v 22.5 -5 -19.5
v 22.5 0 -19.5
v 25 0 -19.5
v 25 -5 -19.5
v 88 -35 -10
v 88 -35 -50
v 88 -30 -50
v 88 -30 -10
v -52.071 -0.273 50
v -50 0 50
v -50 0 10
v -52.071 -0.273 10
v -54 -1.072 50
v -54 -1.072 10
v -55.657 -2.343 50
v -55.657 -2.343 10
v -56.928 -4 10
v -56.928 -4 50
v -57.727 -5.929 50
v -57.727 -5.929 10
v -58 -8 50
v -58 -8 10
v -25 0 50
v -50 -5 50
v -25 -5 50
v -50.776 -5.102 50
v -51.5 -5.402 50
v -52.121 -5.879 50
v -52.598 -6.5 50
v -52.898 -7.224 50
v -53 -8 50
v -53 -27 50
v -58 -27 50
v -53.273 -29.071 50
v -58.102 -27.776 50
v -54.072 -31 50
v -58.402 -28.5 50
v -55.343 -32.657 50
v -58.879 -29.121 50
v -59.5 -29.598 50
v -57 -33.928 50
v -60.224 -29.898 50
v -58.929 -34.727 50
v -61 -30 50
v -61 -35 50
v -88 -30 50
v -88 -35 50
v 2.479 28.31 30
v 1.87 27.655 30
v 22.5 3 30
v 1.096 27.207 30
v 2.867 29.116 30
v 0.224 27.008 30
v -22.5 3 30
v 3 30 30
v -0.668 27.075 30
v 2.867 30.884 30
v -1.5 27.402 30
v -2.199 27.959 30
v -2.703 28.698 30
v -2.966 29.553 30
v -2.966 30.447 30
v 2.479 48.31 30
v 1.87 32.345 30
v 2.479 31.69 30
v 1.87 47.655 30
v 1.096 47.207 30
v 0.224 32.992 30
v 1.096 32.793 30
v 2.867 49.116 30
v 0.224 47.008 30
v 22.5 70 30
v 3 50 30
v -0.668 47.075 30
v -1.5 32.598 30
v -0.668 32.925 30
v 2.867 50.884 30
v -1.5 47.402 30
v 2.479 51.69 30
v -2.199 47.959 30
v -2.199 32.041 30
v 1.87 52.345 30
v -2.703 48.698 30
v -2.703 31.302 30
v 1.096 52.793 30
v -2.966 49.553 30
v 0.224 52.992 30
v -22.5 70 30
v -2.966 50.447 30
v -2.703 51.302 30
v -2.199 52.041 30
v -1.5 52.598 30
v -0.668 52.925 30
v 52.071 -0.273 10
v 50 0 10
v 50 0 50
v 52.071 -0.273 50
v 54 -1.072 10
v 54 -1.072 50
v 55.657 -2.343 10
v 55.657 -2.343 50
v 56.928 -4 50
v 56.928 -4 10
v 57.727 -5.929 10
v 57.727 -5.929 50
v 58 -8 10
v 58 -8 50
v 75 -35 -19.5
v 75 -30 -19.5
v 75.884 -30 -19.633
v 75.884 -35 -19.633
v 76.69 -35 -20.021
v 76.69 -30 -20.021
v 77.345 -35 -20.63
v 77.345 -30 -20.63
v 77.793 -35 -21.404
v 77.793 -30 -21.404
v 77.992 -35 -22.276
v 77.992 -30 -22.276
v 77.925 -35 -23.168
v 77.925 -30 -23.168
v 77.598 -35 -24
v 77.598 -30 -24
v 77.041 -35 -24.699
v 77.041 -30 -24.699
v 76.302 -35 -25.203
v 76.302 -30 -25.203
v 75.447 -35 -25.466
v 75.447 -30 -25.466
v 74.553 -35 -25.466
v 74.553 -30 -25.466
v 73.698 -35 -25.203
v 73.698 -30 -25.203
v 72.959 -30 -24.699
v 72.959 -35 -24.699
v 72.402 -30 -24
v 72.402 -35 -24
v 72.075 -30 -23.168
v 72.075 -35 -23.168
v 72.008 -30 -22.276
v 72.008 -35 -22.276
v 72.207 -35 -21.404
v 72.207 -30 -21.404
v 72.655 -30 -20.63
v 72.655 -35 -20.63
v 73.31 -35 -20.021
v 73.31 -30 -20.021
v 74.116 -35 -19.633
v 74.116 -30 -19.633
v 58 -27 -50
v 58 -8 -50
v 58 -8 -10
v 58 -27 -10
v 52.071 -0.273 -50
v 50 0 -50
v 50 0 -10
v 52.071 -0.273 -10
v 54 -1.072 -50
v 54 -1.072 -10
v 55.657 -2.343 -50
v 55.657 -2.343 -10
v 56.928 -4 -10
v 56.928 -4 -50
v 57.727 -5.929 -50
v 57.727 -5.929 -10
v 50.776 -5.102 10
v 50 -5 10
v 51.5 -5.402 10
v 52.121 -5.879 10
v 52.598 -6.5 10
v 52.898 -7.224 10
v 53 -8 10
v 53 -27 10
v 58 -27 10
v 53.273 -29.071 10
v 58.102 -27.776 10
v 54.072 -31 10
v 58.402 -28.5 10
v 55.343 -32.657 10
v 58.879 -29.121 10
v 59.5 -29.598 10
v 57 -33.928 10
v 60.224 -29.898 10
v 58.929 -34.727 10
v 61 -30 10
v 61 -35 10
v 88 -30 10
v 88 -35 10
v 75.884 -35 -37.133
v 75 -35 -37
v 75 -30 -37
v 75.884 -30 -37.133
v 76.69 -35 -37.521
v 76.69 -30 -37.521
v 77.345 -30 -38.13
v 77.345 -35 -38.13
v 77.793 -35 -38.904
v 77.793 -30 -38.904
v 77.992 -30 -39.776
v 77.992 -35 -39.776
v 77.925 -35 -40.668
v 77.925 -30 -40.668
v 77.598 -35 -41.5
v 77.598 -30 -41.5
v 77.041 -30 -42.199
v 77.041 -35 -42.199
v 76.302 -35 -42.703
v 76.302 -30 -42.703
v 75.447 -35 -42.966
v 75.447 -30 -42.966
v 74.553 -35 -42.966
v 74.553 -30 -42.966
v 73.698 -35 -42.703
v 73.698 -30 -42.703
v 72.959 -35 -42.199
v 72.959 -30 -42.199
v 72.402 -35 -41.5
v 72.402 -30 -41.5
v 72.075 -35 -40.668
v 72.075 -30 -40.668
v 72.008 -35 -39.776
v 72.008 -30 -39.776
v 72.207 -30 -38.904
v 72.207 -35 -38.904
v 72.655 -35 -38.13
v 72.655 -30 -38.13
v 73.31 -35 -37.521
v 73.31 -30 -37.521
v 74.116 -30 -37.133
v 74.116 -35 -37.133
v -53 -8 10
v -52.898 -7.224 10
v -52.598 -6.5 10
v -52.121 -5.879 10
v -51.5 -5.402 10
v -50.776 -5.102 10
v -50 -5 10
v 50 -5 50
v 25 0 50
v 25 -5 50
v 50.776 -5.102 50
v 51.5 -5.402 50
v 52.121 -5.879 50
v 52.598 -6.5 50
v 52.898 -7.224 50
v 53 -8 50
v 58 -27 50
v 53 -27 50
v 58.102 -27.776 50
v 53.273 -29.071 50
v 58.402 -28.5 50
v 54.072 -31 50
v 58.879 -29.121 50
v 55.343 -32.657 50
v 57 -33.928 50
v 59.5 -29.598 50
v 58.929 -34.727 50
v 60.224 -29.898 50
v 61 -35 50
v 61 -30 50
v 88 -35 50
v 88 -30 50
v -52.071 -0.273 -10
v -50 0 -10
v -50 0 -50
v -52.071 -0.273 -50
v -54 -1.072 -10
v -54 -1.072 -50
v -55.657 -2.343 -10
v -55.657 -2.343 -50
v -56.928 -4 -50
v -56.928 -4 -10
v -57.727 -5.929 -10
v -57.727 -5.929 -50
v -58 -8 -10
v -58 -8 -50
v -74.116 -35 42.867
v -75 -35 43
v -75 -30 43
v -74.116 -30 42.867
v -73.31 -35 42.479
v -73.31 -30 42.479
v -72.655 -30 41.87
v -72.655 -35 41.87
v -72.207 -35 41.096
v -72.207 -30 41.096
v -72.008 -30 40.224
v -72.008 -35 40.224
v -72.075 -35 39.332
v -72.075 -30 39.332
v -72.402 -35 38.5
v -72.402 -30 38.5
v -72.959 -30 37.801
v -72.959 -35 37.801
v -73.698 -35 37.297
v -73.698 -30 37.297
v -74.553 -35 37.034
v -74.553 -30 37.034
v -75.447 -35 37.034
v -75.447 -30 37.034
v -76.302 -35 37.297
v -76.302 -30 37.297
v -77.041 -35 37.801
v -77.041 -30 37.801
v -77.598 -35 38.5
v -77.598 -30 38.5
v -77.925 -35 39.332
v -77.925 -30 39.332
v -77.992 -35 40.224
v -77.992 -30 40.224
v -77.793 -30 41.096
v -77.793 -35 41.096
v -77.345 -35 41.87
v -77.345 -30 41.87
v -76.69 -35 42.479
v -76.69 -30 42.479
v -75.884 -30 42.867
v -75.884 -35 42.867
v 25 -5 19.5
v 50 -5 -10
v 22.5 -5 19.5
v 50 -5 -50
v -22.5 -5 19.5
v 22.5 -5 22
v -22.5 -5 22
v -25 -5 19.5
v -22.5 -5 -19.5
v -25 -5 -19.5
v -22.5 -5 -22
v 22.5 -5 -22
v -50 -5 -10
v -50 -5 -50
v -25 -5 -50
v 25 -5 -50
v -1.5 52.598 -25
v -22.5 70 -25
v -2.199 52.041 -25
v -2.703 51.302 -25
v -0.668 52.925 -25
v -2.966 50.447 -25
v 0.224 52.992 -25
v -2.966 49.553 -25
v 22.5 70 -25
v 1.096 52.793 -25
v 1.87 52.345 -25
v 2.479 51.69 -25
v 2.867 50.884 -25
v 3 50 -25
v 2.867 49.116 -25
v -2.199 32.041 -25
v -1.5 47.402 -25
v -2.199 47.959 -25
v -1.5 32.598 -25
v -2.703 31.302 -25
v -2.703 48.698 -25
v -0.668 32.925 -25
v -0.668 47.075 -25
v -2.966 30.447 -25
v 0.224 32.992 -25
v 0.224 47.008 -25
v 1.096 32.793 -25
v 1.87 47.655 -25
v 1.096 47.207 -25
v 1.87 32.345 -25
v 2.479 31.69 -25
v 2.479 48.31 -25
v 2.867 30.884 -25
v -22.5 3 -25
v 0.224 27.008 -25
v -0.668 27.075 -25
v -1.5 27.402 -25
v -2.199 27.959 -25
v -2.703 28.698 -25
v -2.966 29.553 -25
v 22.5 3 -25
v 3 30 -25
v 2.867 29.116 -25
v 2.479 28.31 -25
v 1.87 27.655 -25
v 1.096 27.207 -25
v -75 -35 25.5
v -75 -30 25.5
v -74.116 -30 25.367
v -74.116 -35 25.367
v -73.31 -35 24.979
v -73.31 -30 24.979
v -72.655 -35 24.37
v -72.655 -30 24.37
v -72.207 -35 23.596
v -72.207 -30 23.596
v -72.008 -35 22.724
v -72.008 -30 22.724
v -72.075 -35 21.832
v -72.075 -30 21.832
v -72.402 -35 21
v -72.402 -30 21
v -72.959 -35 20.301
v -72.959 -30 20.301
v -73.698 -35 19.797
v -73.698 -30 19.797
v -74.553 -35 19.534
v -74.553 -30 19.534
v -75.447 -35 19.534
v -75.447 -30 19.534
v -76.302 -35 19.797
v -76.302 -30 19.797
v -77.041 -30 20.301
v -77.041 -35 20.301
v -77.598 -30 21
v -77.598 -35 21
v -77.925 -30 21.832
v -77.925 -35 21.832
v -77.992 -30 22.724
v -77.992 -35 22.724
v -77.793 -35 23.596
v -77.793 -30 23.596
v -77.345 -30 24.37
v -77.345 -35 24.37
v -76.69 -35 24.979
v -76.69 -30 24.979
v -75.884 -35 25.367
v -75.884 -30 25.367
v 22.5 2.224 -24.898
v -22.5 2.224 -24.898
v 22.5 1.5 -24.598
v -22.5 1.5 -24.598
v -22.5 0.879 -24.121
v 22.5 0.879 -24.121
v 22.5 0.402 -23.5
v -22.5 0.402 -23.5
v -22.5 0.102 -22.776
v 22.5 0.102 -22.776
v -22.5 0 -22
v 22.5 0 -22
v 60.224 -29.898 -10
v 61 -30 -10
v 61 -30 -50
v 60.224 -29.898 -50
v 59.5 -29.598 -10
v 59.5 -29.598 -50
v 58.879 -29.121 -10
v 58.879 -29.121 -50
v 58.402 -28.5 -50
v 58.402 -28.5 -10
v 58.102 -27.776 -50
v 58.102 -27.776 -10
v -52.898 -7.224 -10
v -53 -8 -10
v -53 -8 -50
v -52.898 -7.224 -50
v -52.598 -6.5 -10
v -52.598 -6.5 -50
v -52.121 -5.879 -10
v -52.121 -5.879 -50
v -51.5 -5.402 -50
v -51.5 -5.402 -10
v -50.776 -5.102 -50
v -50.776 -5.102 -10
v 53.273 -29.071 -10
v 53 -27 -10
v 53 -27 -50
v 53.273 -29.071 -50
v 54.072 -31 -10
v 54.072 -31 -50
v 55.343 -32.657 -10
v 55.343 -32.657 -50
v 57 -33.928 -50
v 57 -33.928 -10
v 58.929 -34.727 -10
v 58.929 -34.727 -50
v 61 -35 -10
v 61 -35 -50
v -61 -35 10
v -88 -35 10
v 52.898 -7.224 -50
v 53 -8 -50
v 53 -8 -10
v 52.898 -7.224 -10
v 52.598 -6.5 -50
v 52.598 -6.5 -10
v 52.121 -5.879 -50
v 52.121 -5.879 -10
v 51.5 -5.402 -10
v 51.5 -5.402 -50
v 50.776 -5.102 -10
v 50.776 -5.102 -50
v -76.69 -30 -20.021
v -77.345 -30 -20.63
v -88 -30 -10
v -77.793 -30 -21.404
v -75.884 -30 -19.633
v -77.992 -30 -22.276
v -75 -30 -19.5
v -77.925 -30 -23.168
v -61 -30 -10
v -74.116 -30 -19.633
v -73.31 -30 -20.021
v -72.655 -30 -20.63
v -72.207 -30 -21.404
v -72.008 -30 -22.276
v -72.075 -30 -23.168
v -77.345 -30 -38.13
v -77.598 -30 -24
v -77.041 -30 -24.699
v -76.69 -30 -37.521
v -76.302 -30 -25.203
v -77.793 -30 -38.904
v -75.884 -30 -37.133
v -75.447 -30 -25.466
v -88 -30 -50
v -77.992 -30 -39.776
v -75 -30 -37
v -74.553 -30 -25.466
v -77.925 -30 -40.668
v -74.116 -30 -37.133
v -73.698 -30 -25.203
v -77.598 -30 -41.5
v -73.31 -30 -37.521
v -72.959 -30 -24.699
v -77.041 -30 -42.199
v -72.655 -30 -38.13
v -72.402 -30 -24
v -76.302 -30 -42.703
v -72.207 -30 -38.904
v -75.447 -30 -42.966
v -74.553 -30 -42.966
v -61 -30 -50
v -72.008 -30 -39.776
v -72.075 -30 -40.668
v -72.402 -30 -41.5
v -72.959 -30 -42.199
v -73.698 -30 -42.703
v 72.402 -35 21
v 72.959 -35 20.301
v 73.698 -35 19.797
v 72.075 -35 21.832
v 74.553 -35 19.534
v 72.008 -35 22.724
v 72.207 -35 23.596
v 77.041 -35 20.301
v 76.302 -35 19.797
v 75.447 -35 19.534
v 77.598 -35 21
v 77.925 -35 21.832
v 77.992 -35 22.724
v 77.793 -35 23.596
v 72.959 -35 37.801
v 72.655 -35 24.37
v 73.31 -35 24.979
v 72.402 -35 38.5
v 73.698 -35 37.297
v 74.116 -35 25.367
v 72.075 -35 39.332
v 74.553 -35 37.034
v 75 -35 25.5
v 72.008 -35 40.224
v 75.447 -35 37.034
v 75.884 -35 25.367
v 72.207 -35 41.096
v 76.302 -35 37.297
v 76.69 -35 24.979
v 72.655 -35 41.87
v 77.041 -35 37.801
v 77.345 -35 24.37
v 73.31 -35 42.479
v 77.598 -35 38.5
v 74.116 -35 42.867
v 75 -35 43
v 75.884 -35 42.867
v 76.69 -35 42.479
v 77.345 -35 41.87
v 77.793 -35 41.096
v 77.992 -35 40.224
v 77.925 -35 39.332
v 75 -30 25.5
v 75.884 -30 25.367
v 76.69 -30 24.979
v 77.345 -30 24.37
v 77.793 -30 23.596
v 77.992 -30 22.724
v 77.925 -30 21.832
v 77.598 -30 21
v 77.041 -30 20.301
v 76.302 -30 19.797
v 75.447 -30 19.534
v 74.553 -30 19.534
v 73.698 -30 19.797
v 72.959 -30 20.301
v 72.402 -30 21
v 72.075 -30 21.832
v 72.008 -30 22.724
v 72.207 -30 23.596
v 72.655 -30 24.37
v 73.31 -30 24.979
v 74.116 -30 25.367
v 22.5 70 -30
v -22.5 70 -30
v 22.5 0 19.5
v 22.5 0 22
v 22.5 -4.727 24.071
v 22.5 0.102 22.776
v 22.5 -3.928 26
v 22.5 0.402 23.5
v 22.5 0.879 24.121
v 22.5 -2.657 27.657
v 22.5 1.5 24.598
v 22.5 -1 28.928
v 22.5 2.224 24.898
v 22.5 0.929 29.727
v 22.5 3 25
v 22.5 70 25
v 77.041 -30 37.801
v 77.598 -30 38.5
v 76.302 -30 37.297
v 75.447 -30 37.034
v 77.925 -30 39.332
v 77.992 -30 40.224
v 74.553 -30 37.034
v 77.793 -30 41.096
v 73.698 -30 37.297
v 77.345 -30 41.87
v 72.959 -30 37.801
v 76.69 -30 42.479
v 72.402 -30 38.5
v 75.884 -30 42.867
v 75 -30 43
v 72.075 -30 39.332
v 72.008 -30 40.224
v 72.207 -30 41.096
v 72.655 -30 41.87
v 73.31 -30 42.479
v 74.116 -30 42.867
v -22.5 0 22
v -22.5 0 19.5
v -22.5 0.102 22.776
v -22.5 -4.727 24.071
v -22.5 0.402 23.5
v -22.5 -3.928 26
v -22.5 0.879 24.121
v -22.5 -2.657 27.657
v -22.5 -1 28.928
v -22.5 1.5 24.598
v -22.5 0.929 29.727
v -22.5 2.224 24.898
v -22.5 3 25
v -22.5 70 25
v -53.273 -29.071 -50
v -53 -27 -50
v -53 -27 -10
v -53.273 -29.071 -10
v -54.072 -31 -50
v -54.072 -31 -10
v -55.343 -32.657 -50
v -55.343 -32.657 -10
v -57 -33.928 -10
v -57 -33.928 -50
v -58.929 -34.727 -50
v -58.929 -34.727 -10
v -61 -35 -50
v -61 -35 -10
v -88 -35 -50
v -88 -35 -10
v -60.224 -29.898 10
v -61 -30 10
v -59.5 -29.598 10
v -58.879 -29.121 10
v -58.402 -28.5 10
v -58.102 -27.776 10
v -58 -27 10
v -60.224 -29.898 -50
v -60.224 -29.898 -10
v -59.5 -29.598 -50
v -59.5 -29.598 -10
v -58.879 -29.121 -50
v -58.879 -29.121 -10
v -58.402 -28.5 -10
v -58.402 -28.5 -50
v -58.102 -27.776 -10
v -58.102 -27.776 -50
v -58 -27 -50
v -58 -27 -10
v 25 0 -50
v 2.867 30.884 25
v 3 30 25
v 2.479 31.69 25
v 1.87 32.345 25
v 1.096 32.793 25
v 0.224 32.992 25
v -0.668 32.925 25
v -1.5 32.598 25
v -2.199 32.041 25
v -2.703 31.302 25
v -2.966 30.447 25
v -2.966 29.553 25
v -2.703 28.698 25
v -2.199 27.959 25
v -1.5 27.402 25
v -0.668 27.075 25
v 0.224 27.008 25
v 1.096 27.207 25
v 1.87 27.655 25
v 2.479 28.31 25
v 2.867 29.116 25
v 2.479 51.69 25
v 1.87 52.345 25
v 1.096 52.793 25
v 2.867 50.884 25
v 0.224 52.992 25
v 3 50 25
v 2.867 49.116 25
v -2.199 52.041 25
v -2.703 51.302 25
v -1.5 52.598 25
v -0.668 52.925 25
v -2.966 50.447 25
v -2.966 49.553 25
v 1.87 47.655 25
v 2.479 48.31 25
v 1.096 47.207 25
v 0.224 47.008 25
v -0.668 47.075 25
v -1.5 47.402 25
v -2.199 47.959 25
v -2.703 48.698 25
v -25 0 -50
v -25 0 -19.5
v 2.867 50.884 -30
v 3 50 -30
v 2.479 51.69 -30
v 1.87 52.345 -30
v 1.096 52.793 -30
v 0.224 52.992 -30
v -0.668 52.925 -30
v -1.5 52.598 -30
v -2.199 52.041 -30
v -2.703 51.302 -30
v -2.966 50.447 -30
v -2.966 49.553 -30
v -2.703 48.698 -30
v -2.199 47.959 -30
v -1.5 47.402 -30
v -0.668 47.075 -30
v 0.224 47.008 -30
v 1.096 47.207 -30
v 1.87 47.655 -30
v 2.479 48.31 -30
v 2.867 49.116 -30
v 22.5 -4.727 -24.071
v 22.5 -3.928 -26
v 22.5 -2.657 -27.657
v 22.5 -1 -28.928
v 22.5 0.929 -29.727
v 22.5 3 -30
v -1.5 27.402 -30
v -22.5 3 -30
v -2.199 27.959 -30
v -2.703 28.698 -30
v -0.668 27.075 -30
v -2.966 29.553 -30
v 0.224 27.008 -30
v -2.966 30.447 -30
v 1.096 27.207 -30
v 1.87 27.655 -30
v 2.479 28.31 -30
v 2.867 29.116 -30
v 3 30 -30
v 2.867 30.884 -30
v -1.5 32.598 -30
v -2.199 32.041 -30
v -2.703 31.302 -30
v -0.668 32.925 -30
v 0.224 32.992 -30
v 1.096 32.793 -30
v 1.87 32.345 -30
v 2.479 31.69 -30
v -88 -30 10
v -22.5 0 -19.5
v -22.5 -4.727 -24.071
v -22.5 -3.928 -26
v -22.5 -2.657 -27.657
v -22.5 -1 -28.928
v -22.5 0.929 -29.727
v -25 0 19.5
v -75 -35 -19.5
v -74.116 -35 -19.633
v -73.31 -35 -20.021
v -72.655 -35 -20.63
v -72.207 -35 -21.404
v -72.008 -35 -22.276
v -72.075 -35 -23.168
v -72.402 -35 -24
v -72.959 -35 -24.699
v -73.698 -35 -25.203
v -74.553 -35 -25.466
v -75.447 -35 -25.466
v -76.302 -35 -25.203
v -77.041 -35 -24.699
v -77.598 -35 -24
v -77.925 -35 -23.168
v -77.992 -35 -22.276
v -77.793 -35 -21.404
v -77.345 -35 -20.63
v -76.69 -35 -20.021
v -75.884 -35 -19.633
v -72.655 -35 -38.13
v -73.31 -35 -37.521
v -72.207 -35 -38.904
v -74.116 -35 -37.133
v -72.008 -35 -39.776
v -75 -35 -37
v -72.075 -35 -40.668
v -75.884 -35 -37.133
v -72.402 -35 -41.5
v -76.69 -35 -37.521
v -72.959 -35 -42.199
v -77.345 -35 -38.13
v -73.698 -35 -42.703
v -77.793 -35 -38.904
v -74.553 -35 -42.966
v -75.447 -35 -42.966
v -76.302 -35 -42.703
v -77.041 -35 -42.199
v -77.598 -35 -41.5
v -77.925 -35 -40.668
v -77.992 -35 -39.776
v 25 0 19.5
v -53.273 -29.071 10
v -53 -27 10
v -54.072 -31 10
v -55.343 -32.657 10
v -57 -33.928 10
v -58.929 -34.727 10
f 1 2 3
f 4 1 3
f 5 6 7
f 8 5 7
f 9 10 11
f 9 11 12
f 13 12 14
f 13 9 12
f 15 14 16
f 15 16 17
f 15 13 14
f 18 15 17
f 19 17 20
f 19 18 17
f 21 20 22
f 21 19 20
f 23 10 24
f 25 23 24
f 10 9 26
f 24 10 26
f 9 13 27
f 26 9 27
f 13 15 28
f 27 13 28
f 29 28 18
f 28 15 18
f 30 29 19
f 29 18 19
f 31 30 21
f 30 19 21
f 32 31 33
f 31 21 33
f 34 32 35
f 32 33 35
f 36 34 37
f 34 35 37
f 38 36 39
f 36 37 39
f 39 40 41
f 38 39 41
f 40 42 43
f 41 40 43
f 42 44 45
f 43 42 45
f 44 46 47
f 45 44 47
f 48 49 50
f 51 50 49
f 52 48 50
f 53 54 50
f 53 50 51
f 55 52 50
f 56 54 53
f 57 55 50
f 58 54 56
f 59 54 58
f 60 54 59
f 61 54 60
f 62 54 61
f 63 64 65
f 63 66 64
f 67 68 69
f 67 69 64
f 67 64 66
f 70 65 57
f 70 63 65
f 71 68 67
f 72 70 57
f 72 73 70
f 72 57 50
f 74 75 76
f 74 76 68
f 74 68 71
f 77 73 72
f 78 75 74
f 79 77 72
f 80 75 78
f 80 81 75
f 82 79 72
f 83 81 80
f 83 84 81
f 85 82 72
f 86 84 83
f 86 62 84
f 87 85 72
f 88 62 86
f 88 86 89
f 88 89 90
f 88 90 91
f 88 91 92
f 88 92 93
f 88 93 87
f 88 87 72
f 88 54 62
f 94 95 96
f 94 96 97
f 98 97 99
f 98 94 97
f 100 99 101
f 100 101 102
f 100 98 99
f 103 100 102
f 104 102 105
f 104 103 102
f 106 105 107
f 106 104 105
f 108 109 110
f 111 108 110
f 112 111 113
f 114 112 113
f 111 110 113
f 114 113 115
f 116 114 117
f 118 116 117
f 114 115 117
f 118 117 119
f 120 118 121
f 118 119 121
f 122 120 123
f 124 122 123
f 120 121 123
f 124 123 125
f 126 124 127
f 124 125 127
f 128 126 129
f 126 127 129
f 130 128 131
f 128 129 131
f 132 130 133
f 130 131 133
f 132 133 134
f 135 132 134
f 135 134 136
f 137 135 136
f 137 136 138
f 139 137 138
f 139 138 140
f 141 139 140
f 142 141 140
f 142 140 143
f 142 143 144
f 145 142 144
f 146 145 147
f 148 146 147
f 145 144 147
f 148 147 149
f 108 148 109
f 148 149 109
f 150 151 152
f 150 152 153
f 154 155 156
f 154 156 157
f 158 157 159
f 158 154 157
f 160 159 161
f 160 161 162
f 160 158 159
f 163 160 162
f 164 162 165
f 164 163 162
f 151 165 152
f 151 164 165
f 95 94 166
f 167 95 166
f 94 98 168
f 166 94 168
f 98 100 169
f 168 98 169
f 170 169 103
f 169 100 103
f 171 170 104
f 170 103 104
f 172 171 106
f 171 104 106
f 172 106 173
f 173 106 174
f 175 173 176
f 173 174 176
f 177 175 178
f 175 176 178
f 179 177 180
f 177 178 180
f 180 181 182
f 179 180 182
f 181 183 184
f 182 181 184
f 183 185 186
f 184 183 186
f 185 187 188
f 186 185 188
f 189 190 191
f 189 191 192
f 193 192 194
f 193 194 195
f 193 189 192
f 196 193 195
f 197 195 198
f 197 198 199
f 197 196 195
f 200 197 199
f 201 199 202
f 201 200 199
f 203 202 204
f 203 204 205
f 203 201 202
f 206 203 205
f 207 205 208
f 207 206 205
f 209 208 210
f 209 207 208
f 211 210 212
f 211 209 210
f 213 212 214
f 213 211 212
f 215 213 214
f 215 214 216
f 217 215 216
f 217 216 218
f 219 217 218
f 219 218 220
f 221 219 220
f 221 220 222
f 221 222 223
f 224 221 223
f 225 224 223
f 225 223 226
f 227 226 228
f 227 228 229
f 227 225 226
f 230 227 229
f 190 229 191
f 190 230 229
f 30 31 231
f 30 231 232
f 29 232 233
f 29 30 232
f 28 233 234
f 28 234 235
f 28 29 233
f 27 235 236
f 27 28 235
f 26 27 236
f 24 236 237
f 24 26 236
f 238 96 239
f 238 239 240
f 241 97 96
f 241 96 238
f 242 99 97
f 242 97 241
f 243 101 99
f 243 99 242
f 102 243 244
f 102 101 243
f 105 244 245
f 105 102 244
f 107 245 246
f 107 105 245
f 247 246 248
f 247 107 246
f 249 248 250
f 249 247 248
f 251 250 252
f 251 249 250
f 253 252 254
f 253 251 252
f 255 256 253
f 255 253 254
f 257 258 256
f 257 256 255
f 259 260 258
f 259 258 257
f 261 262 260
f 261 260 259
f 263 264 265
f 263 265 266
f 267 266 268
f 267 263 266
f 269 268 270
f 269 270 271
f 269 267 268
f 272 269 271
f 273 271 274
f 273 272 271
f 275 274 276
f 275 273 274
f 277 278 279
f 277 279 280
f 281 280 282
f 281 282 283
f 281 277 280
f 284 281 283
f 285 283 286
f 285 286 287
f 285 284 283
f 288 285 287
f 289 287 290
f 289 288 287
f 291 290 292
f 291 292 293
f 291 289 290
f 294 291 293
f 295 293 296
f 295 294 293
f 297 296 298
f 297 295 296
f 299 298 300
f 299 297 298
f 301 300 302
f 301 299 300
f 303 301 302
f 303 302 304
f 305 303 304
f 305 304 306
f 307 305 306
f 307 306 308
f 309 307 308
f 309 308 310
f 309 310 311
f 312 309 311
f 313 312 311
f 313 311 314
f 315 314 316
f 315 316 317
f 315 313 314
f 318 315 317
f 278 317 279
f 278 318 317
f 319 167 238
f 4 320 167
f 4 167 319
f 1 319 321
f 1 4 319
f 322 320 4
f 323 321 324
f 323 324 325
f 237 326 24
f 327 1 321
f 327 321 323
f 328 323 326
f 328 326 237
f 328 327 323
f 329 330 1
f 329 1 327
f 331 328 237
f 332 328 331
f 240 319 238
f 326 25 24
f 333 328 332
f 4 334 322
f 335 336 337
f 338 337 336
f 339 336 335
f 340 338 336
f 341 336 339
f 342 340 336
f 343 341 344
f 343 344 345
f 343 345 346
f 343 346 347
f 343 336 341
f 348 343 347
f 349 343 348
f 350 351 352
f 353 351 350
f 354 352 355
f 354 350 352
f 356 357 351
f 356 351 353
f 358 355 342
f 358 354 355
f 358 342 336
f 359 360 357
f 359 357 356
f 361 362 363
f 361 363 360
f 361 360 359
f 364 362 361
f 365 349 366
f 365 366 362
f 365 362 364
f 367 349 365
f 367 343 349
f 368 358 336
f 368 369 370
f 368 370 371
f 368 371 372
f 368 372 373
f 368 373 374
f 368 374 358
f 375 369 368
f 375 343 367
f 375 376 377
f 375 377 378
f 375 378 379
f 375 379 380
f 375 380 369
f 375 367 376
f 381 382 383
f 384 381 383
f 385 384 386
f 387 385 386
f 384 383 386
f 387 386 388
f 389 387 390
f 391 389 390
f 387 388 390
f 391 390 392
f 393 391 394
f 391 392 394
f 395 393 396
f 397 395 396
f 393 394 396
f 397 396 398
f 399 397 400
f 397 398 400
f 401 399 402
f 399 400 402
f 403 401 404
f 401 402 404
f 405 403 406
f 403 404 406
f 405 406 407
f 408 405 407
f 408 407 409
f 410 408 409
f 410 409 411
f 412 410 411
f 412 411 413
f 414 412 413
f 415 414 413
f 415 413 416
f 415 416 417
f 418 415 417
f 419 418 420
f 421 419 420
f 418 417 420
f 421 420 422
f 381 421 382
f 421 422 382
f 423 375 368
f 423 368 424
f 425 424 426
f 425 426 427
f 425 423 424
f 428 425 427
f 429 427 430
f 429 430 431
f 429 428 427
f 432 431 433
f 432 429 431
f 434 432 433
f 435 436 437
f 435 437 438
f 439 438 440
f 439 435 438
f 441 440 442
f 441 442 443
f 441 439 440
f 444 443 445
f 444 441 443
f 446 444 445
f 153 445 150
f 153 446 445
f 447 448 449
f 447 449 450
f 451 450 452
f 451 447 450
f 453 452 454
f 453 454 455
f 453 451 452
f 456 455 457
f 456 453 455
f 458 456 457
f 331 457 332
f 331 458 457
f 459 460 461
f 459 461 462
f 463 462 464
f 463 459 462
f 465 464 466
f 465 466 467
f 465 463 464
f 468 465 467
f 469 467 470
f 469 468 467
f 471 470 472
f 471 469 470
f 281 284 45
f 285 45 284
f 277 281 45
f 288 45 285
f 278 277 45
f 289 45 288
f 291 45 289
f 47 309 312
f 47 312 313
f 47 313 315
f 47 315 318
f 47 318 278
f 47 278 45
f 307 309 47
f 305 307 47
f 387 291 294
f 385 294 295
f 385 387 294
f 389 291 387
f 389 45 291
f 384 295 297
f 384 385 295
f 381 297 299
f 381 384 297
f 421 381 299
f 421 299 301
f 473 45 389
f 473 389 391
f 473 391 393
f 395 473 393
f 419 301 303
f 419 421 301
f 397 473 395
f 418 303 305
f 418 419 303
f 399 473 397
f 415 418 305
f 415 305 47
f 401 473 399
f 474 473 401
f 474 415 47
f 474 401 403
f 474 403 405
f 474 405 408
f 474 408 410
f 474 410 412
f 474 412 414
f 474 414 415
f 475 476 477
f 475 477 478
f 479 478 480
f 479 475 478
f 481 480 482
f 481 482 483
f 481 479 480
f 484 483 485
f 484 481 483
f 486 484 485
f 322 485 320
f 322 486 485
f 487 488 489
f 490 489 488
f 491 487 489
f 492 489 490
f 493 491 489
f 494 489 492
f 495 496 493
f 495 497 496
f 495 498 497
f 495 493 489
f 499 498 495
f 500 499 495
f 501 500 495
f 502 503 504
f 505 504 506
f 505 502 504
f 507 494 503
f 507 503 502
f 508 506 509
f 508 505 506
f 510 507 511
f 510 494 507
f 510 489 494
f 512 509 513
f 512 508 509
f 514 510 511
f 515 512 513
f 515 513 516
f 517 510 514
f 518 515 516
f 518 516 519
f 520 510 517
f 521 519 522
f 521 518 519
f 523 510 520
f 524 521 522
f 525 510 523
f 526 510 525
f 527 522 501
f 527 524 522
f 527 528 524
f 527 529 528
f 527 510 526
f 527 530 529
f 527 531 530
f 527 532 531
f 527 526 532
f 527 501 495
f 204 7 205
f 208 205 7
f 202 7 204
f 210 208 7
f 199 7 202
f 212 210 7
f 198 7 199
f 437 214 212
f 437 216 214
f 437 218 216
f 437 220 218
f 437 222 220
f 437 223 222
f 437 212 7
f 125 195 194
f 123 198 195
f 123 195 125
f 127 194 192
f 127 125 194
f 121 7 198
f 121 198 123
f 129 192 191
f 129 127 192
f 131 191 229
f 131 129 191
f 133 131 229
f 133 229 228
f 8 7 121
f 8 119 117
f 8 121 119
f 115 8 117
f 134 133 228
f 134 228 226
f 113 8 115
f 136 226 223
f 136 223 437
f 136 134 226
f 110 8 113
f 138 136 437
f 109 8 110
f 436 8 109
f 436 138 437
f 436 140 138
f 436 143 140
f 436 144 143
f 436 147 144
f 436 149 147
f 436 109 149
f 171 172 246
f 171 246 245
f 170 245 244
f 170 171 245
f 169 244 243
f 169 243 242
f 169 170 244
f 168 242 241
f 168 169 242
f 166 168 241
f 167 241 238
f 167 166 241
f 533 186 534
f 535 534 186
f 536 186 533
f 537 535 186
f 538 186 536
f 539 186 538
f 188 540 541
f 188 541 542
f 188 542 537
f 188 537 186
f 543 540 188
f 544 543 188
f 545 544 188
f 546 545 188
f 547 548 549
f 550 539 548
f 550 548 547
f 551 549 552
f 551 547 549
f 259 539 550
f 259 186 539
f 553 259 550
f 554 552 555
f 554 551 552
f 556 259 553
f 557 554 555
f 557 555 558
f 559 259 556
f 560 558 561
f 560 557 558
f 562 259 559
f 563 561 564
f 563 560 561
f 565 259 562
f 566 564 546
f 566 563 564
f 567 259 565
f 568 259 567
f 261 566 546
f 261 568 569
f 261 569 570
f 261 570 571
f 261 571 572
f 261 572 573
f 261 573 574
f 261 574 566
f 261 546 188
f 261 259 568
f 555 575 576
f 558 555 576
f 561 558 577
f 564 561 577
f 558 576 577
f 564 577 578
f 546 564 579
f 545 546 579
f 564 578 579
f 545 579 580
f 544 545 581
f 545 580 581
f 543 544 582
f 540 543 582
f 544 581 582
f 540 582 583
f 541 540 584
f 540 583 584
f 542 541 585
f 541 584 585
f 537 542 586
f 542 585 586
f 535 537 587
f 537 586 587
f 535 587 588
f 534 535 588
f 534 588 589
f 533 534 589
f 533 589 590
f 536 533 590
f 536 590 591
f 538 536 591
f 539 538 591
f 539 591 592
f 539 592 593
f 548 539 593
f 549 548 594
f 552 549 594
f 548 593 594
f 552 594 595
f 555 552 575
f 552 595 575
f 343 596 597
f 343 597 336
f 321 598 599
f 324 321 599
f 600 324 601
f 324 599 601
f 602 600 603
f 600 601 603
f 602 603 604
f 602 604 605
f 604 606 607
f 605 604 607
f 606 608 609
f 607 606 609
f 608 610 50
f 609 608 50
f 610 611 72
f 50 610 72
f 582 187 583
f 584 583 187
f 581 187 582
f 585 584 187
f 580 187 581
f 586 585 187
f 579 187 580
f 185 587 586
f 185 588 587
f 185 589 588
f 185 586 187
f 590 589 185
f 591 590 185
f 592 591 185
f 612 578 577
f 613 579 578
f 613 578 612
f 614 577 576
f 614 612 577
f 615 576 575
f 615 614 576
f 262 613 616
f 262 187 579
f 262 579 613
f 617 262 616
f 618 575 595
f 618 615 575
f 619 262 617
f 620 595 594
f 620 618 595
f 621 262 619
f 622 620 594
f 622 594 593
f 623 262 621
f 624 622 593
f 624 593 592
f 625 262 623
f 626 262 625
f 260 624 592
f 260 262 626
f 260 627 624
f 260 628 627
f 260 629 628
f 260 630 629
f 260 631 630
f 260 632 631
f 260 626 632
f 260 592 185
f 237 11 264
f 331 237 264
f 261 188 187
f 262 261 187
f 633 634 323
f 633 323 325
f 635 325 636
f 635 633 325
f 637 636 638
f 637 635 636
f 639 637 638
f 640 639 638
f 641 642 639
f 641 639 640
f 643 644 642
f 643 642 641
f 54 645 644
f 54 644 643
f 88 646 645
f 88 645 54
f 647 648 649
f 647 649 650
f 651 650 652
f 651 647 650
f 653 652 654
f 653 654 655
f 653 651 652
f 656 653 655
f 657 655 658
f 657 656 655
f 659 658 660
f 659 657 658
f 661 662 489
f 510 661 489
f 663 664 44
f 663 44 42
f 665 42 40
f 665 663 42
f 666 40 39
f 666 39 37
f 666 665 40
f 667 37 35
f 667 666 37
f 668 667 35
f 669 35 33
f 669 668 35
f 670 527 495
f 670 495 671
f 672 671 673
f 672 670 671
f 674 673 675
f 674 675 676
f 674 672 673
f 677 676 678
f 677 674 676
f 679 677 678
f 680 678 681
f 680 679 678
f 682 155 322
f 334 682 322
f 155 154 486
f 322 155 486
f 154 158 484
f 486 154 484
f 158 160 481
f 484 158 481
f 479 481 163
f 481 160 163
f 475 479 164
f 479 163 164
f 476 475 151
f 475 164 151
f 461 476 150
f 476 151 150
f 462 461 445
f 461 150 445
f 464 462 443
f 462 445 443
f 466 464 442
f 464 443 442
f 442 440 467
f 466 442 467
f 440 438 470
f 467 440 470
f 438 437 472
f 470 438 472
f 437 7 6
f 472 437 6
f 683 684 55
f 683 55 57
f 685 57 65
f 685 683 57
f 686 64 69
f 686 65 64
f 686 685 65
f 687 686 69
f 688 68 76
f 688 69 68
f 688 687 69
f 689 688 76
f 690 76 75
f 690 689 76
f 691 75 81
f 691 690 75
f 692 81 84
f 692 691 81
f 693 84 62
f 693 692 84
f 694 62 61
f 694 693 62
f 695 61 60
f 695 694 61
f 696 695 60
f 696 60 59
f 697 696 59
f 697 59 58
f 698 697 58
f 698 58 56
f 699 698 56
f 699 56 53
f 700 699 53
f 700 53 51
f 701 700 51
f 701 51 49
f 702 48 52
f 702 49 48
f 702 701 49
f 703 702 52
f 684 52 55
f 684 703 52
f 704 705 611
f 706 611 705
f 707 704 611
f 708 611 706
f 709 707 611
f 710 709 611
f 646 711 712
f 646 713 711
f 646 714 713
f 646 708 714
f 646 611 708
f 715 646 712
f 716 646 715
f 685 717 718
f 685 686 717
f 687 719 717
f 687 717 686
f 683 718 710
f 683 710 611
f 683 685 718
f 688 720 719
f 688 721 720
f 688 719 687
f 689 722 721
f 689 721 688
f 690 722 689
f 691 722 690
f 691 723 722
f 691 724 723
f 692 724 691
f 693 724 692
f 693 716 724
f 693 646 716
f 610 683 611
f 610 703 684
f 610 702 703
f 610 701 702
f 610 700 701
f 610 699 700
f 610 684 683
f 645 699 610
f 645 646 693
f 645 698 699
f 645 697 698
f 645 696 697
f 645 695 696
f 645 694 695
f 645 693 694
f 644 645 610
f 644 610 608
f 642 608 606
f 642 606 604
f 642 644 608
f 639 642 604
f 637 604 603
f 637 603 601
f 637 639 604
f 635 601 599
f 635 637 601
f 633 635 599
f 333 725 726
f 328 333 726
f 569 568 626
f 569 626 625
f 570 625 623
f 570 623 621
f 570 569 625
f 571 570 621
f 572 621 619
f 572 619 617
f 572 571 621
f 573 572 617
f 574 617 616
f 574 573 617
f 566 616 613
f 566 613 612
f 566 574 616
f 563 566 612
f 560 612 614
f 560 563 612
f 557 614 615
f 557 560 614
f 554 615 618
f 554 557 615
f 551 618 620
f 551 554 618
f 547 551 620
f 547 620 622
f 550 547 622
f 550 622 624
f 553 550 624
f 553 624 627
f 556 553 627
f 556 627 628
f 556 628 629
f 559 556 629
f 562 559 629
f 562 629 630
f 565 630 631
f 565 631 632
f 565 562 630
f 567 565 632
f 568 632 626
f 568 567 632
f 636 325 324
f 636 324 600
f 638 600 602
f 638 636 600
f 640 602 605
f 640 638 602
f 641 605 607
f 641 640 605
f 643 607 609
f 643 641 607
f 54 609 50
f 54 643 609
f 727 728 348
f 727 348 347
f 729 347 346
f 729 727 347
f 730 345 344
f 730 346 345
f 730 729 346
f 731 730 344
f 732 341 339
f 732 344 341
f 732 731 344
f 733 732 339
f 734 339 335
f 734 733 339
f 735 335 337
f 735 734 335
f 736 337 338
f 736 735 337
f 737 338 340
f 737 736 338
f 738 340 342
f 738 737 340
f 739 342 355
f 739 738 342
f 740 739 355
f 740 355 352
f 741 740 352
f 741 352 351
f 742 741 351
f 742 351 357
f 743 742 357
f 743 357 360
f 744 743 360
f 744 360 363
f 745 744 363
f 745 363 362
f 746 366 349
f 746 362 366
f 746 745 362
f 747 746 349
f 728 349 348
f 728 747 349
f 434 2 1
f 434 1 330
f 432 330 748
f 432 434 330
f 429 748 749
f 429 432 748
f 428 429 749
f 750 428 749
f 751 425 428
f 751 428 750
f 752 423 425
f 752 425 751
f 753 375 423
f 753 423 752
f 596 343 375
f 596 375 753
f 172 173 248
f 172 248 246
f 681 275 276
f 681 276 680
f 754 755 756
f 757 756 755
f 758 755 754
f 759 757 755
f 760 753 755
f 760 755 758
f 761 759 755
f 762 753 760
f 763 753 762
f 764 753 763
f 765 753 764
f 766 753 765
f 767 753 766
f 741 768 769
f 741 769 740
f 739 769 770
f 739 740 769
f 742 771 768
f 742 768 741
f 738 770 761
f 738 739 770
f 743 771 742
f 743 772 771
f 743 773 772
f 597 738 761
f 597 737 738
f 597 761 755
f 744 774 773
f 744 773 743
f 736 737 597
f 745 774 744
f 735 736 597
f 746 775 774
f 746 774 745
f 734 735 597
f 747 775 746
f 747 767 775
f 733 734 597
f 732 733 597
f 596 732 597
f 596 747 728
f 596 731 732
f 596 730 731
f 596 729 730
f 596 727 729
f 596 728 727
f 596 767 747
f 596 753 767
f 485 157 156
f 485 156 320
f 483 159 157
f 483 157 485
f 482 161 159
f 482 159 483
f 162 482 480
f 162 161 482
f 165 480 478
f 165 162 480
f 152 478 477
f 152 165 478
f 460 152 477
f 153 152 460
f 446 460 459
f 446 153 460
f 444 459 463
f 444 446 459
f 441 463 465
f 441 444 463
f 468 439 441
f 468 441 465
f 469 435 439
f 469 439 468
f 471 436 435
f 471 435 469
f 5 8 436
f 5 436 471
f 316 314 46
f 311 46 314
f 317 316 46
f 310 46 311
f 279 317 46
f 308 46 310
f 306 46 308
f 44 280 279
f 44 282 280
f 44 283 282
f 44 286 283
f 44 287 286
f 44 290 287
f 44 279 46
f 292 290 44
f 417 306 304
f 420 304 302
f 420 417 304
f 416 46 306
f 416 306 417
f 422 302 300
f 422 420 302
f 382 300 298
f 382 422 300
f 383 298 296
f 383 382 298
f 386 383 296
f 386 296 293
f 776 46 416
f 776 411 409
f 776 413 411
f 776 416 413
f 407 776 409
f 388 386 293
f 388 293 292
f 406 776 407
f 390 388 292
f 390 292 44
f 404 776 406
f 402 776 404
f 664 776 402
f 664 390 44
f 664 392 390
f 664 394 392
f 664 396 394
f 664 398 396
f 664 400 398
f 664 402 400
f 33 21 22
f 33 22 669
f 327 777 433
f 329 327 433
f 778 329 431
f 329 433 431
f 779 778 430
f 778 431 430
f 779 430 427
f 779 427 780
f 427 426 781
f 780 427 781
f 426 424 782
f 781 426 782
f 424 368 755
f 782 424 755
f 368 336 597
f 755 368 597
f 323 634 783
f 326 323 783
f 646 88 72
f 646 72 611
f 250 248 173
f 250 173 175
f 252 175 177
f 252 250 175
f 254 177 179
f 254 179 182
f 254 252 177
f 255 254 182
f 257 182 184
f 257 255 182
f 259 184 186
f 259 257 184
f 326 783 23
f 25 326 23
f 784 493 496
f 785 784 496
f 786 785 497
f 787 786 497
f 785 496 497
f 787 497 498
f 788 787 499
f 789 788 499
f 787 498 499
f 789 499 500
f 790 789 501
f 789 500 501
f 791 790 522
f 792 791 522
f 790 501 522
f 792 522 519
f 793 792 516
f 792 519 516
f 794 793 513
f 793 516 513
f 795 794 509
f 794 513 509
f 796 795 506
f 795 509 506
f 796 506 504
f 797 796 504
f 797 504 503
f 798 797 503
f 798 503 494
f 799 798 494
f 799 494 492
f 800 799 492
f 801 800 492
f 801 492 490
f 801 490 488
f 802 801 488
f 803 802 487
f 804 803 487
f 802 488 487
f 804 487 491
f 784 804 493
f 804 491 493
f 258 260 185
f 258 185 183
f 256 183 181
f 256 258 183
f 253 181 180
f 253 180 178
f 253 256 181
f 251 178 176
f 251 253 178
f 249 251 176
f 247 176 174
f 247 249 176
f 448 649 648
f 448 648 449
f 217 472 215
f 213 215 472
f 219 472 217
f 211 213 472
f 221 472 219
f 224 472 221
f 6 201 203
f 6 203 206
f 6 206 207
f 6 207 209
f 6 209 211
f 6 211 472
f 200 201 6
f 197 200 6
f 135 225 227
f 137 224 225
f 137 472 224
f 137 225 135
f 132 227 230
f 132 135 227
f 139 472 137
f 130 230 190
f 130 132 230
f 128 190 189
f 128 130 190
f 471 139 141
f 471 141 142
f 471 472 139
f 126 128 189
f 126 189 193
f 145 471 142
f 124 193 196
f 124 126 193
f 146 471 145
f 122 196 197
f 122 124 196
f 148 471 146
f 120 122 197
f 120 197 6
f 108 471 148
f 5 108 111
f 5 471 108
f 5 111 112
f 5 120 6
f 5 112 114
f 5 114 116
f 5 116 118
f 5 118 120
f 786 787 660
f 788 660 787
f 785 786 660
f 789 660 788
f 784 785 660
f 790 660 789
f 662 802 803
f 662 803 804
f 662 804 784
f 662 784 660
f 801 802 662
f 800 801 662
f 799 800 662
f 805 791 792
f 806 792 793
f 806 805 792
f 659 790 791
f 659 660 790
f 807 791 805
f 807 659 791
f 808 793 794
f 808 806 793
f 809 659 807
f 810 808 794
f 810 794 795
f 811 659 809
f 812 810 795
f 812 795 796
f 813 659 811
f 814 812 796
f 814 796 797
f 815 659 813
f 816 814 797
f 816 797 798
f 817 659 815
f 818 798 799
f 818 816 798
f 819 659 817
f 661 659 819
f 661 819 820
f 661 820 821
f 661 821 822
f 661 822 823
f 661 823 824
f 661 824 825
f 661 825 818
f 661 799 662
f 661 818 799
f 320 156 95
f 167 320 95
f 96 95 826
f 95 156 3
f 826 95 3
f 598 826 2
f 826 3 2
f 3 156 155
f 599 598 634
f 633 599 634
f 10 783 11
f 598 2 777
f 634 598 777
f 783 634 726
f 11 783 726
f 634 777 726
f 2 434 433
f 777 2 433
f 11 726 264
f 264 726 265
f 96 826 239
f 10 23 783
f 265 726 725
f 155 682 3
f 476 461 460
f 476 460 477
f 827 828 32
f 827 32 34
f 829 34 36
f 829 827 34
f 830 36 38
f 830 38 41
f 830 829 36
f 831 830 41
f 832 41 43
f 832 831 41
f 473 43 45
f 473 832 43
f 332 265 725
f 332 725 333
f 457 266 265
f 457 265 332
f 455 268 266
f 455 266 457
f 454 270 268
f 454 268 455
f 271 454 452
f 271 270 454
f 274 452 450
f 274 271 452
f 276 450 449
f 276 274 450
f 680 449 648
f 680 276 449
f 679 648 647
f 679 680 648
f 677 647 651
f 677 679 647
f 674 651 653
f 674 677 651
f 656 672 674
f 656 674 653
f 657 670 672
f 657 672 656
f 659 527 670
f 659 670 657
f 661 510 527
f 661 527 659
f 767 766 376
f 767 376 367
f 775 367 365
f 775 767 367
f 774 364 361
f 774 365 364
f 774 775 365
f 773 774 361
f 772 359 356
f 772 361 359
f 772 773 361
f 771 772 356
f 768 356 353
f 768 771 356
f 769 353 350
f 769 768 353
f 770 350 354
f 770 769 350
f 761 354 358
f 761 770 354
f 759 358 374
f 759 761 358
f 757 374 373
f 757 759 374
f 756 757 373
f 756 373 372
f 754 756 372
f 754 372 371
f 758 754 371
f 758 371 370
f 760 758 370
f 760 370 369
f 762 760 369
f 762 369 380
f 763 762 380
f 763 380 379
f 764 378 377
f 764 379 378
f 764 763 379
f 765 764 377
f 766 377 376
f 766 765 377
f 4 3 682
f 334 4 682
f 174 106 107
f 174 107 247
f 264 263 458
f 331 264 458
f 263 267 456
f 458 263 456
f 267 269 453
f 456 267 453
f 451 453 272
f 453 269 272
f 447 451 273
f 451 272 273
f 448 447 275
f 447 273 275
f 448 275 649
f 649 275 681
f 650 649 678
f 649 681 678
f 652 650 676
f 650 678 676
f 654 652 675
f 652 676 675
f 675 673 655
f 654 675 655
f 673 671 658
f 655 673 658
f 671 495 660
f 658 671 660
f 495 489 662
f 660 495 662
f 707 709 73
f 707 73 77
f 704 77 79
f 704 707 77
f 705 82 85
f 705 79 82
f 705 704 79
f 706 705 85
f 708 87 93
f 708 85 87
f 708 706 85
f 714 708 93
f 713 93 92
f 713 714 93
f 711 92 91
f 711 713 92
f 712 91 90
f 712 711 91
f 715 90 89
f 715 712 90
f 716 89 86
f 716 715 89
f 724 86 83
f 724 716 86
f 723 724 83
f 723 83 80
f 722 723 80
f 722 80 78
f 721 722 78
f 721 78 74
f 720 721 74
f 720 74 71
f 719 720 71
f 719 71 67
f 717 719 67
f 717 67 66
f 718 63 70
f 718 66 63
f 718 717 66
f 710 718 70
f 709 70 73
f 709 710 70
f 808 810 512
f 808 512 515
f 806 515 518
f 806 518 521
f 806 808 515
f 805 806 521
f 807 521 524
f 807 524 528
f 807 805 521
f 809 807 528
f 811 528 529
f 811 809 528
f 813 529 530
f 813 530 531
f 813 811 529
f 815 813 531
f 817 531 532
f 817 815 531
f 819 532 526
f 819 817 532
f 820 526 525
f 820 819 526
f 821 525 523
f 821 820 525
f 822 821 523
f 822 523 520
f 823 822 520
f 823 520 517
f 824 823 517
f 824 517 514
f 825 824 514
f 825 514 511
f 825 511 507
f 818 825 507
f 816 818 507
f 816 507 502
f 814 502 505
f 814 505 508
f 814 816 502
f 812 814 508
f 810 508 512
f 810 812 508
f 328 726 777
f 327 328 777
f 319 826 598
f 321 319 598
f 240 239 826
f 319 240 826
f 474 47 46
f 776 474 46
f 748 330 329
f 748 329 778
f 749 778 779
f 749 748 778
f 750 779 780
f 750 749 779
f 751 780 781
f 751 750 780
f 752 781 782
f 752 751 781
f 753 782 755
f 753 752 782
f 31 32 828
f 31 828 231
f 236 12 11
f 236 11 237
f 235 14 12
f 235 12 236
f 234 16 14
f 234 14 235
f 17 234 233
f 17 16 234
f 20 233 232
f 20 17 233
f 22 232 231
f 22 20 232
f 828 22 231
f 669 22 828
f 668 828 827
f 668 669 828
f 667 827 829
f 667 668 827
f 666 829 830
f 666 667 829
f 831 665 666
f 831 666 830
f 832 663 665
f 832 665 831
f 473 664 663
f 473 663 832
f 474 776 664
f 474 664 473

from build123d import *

# Parameters (mm, degrees)
SM_BASE_FLANGE_1_DEPTH            = 5
SM_EDGE_FLANGE_1_STRIP_W          = 26
SM_EDGE_FLANGE_1_STRIP_H          = 5
SM_EDGE_FLANGE_1_STRIP_CUT_DEPTH  = 45
SM_EDGE_FLANGE_1_RELIEF_W         = 28.5
SM_EDGE_FLANGE_1_RELIEF_H         = 2.5
SM_EDGE_FLANGE_1_RELIEF_CUT_DEPTH = 5
SM_EDGE_FLANGE_1_DEPTH            = 45
SM_EDGE_FLANGE_2_STRIP_W          = 26
SM_EDGE_FLANGE_2_STRIP_H          = 5
SM_EDGE_FLANGE_2_STRIP_CUT_DEPTH  = 45
SM_EDGE_FLANGE_2_RELIEF_W         = 28.5
SM_EDGE_FLANGE_2_RELIEF_H         = 2.5
SM_EDGE_FLANGE_2_RELIEF_CUT_DEPTH = 5
SM_EDGE_FLANGE_2_DEPTH            = 45
SM_EDGE_FLANGE_14_DEPTH           = 40
SM_EDGE_FLANGE_15_DEPTH           = 40
SM_EDGE_FLANGE_16_DEPTH           = 40
SM_EDGE_FLANGE_17_DEPTH           = 40
SM_EDGE_FLANGE_18_STRIP_W         = 26
SM_EDGE_FLANGE_18_STRIP_H         = 5
SM_EDGE_FLANGE_18_STRIP_CUT_DEPTH = 40
SM_EDGE_FLANGE_18_DEPTH           = 40
SM_EDGE_FLANGE_19_STRIP_W         = 26
SM_EDGE_FLANGE_19_STRIP_H         = 5
SM_EDGE_FLANGE_19_STRIP_CUT_DEPTH = 40
SM_EDGE_FLANGE_19_DEPTH           = 40
SM_EDGE_FLANGE_20_STRIP_W         = 26
SM_EDGE_FLANGE_20_STRIP_H         = 5
SM_EDGE_FLANGE_20_STRIP_CUT_DEPTH = 40
SM_EDGE_FLANGE_20_DEPTH           = 40
SM_EDGE_FLANGE_21_STRIP_W         = 26
SM_EDGE_FLANGE_21_STRIP_H         = 5
SM_EDGE_FLANGE_21_STRIP_CUT_DEPTH = 40
SM_EDGE_FLANGE_21_DEPTH           = 40
CUT_EXTRUDE_START                 = -35
SKETCH_80_R                       = 3
CUT_EXTRUDE_1_DEPTH               = 5
CUT_EXTRUDE_3_DEPTH               = 124.060960503
CUT_EXTRUDE_3_DEPTH_BACK          = 124.060960503
SKETCH_83_R                       = 3
CUT_EXTRUDE_START_2               = -30
SKETCH_84_R                       = 3
CUT_EXTRUDE_5_DEPTH               = 5


# Sheet-metal steps are written as plain solids
with BuildPart() as part:
    # Sketch 1 → 基体-法兰1 (new body)
    with BuildSketch(Plane(origin=(0, 0, 0), x_dir=(1, 0, 0), z_dir=(0, 1, 0))):
        Polygon((-25, -25), (-25, -50), (-50, -50), (-50, 50), (-25, 50), (-25, 25), (25, 25), (25, 50), (50, 50), (50, -50), (25, -50), (25, -25), align=None)
    extrude(amount=-SM_BASE_FLANGE_1_DEPTH)

    # 边线-法兰1 strip (across the edge) → 边线-法兰1 strip cut (cut)
    with BuildSketch(Plane(origin=(22.5, 0, -25), x_dir=(0, 0, 1), z_dir=(-1, 0, 0))):
        with Locations((-10, -2.5)):
            Rectangle(SM_EDGE_FLANGE_1_STRIP_W, SM_EDGE_FLANGE_1_STRIP_H)
    extrude(amount=SM_EDGE_FLANGE_1_STRIP_CUT_DEPTH, mode=Mode.SUBTRACT)

    # 边线-法兰1 relief (on the sheet) → 边线-法兰1 relief cut (cut)
    with BuildSketch(Plane(origin=(22.5, 0, -22), x_dir=(0, 0, 1), z_dir=(0, 1, 0))):
        with Locations((-11.75, 1.25)):
            Rectangle(SM_EDGE_FLANGE_1_RELIEF_W, SM_EDGE_FLANGE_1_RELIEF_H)
        with Locations((-11.75, -46.25)):
            Rectangle(SM_EDGE_FLANGE_1_RELIEF_W, SM_EDGE_FLANGE_1_RELIEF_H)
    extrude(amount=-SM_EDGE_FLANGE_1_RELIEF_CUT_DEPTH, mode=Mode.SUBTRACT)

    # 边线-法兰1 section (across the edge) → 边线-法兰1 (add)
    with BuildSketch(Plane(origin=(22.5, 0, -25), x_dir=(0, 0, 1), z_dir=(-1, 0, 0))):
        with BuildLine():
            Line((-5, 3), (-5, 70))
            Line((-5, 70), (0, 70))
            Line((0, 70), (0, 3))
            ThreePointArc((0, 3), (0.878679656, 0.878679656), (3, 0))
            Line((3, 0), (3, -5))
            ThreePointArc((3, -5), (-2.656854249, -2.656854249), (-5, 3))
        make_face()
    extrude(amount=SM_EDGE_FLANGE_1_DEPTH)

    # 边线-法兰2 strip (across the edge) → 边线-法兰2 strip cut (cut)
    with BuildSketch(Plane(origin=(-22.5, 0, 25), x_dir=(0, 0, -1), z_dir=(1, 0, 0))):
        with Locations((-10, -2.5)):
            Rectangle(SM_EDGE_FLANGE_2_STRIP_W, SM_EDGE_FLANGE_2_STRIP_H)
    extrude(amount=SM_EDGE_FLANGE_2_STRIP_CUT_DEPTH, mode=Mode.SUBTRACT)

    # 边线-法兰2 relief (on the sheet) → 边线-法兰2 relief cut (cut)
    with BuildSketch(Plane(origin=(-22.5, 0, 22), x_dir=(0, 0, -1), z_dir=(0, 1, 0))):
        with Locations((-11.75, 1.25)):
            Rectangle(SM_EDGE_FLANGE_2_RELIEF_W, SM_EDGE_FLANGE_2_RELIEF_H)
        with Locations((-11.75, -46.25)):
            Rectangle(SM_EDGE_FLANGE_2_RELIEF_W, SM_EDGE_FLANGE_2_RELIEF_H)
    extrude(amount=-SM_EDGE_FLANGE_2_RELIEF_CUT_DEPTH, mode=Mode.SUBTRACT)

    # 边线-法兰2 section (across the edge) → 边线-法兰2 (add)
    with BuildSketch(Plane(origin=(-22.5, 0, 25), x_dir=(0, 0, -1), z_dir=(1, 0, 0))):
        with BuildLine():
            Line((-5, 3), (-5, 70))
            Line((-5, 70), (0, 70))
            Line((0, 70), (0, 3))
            ThreePointArc((0, 3), (0.878679656, 0.878679656), (3, 0))
            Line((3, 0), (3, -5))
            ThreePointArc((3, -5), (-2.656854249, -2.656854249), (-5, 3))
        make_face()
    extrude(amount=SM_EDGE_FLANGE_2_DEPTH)

    # 边线-法兰14 section (across the edge) → 边线-法兰14 (add)
    with BuildSketch(Plane(origin=(53, -5, 10), x_dir=(-1, 0, 0), z_dir=(0, 0, 1))):
        with BuildLine():
            Line((-5, 3), (-5, 30))
            Line((-5, 30), (0, 30))
            Line((0, 30), (0, 3))
            ThreePointArc((0, 3), (0.878679656, 0.878679656), (3, 0))
            Line((3, 0), (3, -5))
            ThreePointArc((3, -5), (-2.656854249, -2.656854249), (-5, 3))
        make_face()
    extrude(amount=SM_EDGE_FLANGE_14_DEPTH)

    # 边线-法兰15 section (across the edge) → 边线-法兰15 (add)
    with BuildSketch(Plane(origin=(53, -5, -50), x_dir=(-1, 0, 0), z_dir=(0, 0, 1))):
        with BuildLine():
            Line((-5, 3), (-5, 30))
            Line((-5, 30), (0, 30))
            Line((0, 30), (0, 3))
            ThreePointArc((0, 3), (0.878679656, 0.878679656), (3, 0))
            Line((3, 0), (3, -5))
            ThreePointArc((3, -5), (-2.656854249, -2.656854249), (-5, 3))
        make_face()
    extrude(amount=SM_EDGE_FLANGE_15_DEPTH)

    # 边线-法兰16 section (across the edge) → 边线-法兰16 (add)
    with BuildSketch(Plane(origin=(-53, -5, -10), x_dir=(1, 0, 0), z_dir=(0, 0, -1))):
        with BuildLine():
            Line((-5, 3), (-5, 30))
            Line((-5, 30), (0, 30))
            Line((0, 30), (0, 3))
            ThreePointArc((0, 3), (0.878679656, 0.878679656), (3, 0))
            Line((3, 0), (3, -5))
            ThreePointArc((3, -5), (-2.656854249, -2.656854249), (-5, 3))
        make_face()
    extrude(amount=SM_EDGE_FLANGE_16_DEPTH)

    # 边线-法兰17 section (across the edge) → 边线-法兰17 (add)
    with BuildSketch(Plane(origin=(-53, -5, 50), x_dir=(1, 0, 0), z_dir=(0, 0, -1))):
        with BuildLine():
            Line((-5, 3), (-5, 30))
            Line((-5, 30), (0, 30))
            Line((0, 30), (0, 3))
            ThreePointArc((0, 3), (0.878679656, 0.878679656), (3, 0))
            Line((3, 0), (3, -5))
            ThreePointArc((3, -5), (-2.656854249, -2.656854249), (-5, 3))
        make_face()
    extrude(amount=SM_EDGE_FLANGE_17_DEPTH)

    # 边线-法兰18 strip (across the edge) → 边线-法兰18 strip cut (cut)
    with BuildSketch(Plane(origin=(-58, -35, -50), x_dir=(0, 1, 0), z_dir=(0, 0, 1))):
        with Locations((-5, -2.5)):
            Rectangle(SM_EDGE_FLANGE_18_STRIP_W, SM_EDGE_FLANGE_18_STRIP_H)
    extrude(amount=SM_EDGE_FLANGE_18_STRIP_CUT_DEPTH, mode=Mode.SUBTRACT)

    # 边线-法兰18 section (across the edge) → 边线-法兰18 (add)
    with BuildSketch(Plane(origin=(-58, -35, -50), x_dir=(0, 1, 0), z_dir=(0, 0, 1))):
        with BuildLine():
            Line((0, 3), (0, 30))
            Line((0, 30), (5, 30))
            Line((5, 30), (5, 3))
            ThreePointArc((5, 3), (5.878679656, 0.878679656), (8, 0))
            Line((8, 0), (8, -5))
            ThreePointArc((8, -5), (2.343145751, -2.656854249), (0, 3))
        make_face()
    extrude(amount=SM_EDGE_FLANGE_18_DEPTH)

    # 边线-法兰19 strip (across the edge) → 边线-法兰19 strip cut (cut)
    with BuildSketch(Plane(origin=(-58, -35, 10), x_dir=(0, 1, 0), z_dir=(0, 0, 1))):
        with Locations((-5, -2.5)):
            Rectangle(SM_EDGE_FLANGE_19_STRIP_W, SM_EDGE_FLANGE_19_STRIP_H)
    extrude(amount=SM_EDGE_FLANGE_19_STRIP_CUT_DEPTH, mode=Mode.SUBTRACT)

    # 边线-法兰19 section (across the edge) → 边线-法兰19 (add)
    with BuildSketch(Plane(origin=(-58, -35, 10), x_dir=(0, 1, 0), z_dir=(0, 0, 1))):
        with BuildLine():
            Line((0, 3), (0, 30))
            Line((0, 30), (5, 30))
            Line((5, 30), (5, 3))
            ThreePointArc((5, 3), (5.878679656, 0.878679656), (8, 0))
            Line((8, 0), (8, -5))
            ThreePointArc((8, -5), (2.343145751, -2.656854249), (0, 3))
        make_face()
    extrude(amount=SM_EDGE_FLANGE_19_DEPTH)

    # 边线-法兰20 strip (across the edge) → 边线-法兰20 strip cut (cut)
    with BuildSketch(Plane(origin=(58, -35, 50), x_dir=(0, 1, 0), z_dir=(0, 0, -1))):
        with Locations((-5, -2.5)):
            Rectangle(SM_EDGE_FLANGE_20_STRIP_W, SM_EDGE_FLANGE_20_STRIP_H)
    extrude(amount=SM_EDGE_FLANGE_20_STRIP_CUT_DEPTH, mode=Mode.SUBTRACT)

    # 边线-法兰20 section (across the edge) → 边线-法兰20 (add)
    with BuildSketch(Plane(origin=(58, -35, 50), x_dir=(0, 1, 0), z_dir=(0, 0, -1))):
        with BuildLine():
            Line((0, 3), (0, 30))
            Line((0, 30), (5, 30))
            Line((5, 30), (5, 3))
            ThreePointArc((5, 3), (5.878679656, 0.878679656), (8, 0))
            Line((8, 0), (8, -5))
            ThreePointArc((8, -5), (2.343145751, -2.656854249), (0, 3))
        make_face()
    extrude(amount=SM_EDGE_FLANGE_20_DEPTH)

    # 边线-法兰21 strip (across the edge) → 边线-法兰21 strip cut (cut)
    with BuildSketch(Plane(origin=(58, -35, -10), x_dir=(0, 1, 0), z_dir=(0, 0, -1))):
        with Locations((-5, -2.5)):
            Rectangle(SM_EDGE_FLANGE_21_STRIP_W, SM_EDGE_FLANGE_21_STRIP_H)
    extrude(amount=SM_EDGE_FLANGE_21_STRIP_CUT_DEPTH, mode=Mode.SUBTRACT)

    # 边线-法兰21 section (across the edge) → 边线-法兰21 (add)
    with BuildSketch(Plane(origin=(58, -35, -10), x_dir=(0, 1, 0), z_dir=(0, 0, -1))):
        with BuildLine():
            Line((0, 3), (0, 30))
            Line((0, 30), (5, 30))
            Line((5, 30), (5, 3))
            ThreePointArc((5, 3), (5.878679656, 0.878679656), (8, 0))
            Line((8, 0), (8, -5))
            ThreePointArc((8, -5), (2.343145751, -2.656854249), (0, 3))
        make_face()
    extrude(amount=SM_EDGE_FLANGE_21_DEPTH)

    # 草图80 → 切除-拉伸1 (cut)
    with BuildSketch(Plane(origin=(0, 0, 0), x_dir=(1, 0, 0), z_dir=(0, 1, 0)).offset(CUT_EXTRUDE_START)):
        with Locations(Location((-75, 40, 0), (0, 0, 270))):
            Circle(SKETCH_80_R)
        with Locations(Location((75, 40, 0), (0, 0, 270))):
            Circle(SKETCH_80_R)
        with Locations(Location((-75, -40, 0), (0, 0, 270))):
            Circle(SKETCH_80_R)
        with Locations(Location((75, -40, 0), (0, 0, 270))):
            Circle(SKETCH_80_R)
    extrude(amount=CUT_EXTRUDE_1_DEPTH, mode=Mode.SUBTRACT)

    # 草图83 → 切除-拉伸3 (cut, two sides: drawn at the far end of the back side and taken through both)
    with BuildSketch(Plane.XY.offset(-CUT_EXTRUDE_3_DEPTH_BACK)):
        with Locations((0, 50)):
            Circle(SKETCH_83_R)
        with Locations((0, 30)):
            Circle(SKETCH_83_R)
    extrude(amount=CUT_EXTRUDE_3_DEPTH + CUT_EXTRUDE_3_DEPTH_BACK, mode=Mode.SUBTRACT)

    # 草图84 → 切除-拉伸5 (cut)
    with BuildSketch(Plane(origin=(0, 0, 0), x_dir=(1, 0, 0), z_dir=(0, 1, 0)).offset(CUT_EXTRUDE_START_2)):
        with Locations(Location((75, 22.5, 0), (0, 0, 270))):
            Circle(SKETCH_84_R)
        with Locations(Location((75, -22.5, 0), (0, 0, 270))):
            Circle(SKETCH_84_R)
        with Locations(Location((-75, -22.5, 0), (0, 0, 270))):
            Circle(SKETCH_84_R)
        with Locations(Location((-75, 22.5, 0), (0, 0, 270))):
            Circle(SKETCH_84_R)
    extrude(amount=-CUT_EXTRUDE_5_DEPTH, mode=Mode.SUBTRACT)


solid = part.part
